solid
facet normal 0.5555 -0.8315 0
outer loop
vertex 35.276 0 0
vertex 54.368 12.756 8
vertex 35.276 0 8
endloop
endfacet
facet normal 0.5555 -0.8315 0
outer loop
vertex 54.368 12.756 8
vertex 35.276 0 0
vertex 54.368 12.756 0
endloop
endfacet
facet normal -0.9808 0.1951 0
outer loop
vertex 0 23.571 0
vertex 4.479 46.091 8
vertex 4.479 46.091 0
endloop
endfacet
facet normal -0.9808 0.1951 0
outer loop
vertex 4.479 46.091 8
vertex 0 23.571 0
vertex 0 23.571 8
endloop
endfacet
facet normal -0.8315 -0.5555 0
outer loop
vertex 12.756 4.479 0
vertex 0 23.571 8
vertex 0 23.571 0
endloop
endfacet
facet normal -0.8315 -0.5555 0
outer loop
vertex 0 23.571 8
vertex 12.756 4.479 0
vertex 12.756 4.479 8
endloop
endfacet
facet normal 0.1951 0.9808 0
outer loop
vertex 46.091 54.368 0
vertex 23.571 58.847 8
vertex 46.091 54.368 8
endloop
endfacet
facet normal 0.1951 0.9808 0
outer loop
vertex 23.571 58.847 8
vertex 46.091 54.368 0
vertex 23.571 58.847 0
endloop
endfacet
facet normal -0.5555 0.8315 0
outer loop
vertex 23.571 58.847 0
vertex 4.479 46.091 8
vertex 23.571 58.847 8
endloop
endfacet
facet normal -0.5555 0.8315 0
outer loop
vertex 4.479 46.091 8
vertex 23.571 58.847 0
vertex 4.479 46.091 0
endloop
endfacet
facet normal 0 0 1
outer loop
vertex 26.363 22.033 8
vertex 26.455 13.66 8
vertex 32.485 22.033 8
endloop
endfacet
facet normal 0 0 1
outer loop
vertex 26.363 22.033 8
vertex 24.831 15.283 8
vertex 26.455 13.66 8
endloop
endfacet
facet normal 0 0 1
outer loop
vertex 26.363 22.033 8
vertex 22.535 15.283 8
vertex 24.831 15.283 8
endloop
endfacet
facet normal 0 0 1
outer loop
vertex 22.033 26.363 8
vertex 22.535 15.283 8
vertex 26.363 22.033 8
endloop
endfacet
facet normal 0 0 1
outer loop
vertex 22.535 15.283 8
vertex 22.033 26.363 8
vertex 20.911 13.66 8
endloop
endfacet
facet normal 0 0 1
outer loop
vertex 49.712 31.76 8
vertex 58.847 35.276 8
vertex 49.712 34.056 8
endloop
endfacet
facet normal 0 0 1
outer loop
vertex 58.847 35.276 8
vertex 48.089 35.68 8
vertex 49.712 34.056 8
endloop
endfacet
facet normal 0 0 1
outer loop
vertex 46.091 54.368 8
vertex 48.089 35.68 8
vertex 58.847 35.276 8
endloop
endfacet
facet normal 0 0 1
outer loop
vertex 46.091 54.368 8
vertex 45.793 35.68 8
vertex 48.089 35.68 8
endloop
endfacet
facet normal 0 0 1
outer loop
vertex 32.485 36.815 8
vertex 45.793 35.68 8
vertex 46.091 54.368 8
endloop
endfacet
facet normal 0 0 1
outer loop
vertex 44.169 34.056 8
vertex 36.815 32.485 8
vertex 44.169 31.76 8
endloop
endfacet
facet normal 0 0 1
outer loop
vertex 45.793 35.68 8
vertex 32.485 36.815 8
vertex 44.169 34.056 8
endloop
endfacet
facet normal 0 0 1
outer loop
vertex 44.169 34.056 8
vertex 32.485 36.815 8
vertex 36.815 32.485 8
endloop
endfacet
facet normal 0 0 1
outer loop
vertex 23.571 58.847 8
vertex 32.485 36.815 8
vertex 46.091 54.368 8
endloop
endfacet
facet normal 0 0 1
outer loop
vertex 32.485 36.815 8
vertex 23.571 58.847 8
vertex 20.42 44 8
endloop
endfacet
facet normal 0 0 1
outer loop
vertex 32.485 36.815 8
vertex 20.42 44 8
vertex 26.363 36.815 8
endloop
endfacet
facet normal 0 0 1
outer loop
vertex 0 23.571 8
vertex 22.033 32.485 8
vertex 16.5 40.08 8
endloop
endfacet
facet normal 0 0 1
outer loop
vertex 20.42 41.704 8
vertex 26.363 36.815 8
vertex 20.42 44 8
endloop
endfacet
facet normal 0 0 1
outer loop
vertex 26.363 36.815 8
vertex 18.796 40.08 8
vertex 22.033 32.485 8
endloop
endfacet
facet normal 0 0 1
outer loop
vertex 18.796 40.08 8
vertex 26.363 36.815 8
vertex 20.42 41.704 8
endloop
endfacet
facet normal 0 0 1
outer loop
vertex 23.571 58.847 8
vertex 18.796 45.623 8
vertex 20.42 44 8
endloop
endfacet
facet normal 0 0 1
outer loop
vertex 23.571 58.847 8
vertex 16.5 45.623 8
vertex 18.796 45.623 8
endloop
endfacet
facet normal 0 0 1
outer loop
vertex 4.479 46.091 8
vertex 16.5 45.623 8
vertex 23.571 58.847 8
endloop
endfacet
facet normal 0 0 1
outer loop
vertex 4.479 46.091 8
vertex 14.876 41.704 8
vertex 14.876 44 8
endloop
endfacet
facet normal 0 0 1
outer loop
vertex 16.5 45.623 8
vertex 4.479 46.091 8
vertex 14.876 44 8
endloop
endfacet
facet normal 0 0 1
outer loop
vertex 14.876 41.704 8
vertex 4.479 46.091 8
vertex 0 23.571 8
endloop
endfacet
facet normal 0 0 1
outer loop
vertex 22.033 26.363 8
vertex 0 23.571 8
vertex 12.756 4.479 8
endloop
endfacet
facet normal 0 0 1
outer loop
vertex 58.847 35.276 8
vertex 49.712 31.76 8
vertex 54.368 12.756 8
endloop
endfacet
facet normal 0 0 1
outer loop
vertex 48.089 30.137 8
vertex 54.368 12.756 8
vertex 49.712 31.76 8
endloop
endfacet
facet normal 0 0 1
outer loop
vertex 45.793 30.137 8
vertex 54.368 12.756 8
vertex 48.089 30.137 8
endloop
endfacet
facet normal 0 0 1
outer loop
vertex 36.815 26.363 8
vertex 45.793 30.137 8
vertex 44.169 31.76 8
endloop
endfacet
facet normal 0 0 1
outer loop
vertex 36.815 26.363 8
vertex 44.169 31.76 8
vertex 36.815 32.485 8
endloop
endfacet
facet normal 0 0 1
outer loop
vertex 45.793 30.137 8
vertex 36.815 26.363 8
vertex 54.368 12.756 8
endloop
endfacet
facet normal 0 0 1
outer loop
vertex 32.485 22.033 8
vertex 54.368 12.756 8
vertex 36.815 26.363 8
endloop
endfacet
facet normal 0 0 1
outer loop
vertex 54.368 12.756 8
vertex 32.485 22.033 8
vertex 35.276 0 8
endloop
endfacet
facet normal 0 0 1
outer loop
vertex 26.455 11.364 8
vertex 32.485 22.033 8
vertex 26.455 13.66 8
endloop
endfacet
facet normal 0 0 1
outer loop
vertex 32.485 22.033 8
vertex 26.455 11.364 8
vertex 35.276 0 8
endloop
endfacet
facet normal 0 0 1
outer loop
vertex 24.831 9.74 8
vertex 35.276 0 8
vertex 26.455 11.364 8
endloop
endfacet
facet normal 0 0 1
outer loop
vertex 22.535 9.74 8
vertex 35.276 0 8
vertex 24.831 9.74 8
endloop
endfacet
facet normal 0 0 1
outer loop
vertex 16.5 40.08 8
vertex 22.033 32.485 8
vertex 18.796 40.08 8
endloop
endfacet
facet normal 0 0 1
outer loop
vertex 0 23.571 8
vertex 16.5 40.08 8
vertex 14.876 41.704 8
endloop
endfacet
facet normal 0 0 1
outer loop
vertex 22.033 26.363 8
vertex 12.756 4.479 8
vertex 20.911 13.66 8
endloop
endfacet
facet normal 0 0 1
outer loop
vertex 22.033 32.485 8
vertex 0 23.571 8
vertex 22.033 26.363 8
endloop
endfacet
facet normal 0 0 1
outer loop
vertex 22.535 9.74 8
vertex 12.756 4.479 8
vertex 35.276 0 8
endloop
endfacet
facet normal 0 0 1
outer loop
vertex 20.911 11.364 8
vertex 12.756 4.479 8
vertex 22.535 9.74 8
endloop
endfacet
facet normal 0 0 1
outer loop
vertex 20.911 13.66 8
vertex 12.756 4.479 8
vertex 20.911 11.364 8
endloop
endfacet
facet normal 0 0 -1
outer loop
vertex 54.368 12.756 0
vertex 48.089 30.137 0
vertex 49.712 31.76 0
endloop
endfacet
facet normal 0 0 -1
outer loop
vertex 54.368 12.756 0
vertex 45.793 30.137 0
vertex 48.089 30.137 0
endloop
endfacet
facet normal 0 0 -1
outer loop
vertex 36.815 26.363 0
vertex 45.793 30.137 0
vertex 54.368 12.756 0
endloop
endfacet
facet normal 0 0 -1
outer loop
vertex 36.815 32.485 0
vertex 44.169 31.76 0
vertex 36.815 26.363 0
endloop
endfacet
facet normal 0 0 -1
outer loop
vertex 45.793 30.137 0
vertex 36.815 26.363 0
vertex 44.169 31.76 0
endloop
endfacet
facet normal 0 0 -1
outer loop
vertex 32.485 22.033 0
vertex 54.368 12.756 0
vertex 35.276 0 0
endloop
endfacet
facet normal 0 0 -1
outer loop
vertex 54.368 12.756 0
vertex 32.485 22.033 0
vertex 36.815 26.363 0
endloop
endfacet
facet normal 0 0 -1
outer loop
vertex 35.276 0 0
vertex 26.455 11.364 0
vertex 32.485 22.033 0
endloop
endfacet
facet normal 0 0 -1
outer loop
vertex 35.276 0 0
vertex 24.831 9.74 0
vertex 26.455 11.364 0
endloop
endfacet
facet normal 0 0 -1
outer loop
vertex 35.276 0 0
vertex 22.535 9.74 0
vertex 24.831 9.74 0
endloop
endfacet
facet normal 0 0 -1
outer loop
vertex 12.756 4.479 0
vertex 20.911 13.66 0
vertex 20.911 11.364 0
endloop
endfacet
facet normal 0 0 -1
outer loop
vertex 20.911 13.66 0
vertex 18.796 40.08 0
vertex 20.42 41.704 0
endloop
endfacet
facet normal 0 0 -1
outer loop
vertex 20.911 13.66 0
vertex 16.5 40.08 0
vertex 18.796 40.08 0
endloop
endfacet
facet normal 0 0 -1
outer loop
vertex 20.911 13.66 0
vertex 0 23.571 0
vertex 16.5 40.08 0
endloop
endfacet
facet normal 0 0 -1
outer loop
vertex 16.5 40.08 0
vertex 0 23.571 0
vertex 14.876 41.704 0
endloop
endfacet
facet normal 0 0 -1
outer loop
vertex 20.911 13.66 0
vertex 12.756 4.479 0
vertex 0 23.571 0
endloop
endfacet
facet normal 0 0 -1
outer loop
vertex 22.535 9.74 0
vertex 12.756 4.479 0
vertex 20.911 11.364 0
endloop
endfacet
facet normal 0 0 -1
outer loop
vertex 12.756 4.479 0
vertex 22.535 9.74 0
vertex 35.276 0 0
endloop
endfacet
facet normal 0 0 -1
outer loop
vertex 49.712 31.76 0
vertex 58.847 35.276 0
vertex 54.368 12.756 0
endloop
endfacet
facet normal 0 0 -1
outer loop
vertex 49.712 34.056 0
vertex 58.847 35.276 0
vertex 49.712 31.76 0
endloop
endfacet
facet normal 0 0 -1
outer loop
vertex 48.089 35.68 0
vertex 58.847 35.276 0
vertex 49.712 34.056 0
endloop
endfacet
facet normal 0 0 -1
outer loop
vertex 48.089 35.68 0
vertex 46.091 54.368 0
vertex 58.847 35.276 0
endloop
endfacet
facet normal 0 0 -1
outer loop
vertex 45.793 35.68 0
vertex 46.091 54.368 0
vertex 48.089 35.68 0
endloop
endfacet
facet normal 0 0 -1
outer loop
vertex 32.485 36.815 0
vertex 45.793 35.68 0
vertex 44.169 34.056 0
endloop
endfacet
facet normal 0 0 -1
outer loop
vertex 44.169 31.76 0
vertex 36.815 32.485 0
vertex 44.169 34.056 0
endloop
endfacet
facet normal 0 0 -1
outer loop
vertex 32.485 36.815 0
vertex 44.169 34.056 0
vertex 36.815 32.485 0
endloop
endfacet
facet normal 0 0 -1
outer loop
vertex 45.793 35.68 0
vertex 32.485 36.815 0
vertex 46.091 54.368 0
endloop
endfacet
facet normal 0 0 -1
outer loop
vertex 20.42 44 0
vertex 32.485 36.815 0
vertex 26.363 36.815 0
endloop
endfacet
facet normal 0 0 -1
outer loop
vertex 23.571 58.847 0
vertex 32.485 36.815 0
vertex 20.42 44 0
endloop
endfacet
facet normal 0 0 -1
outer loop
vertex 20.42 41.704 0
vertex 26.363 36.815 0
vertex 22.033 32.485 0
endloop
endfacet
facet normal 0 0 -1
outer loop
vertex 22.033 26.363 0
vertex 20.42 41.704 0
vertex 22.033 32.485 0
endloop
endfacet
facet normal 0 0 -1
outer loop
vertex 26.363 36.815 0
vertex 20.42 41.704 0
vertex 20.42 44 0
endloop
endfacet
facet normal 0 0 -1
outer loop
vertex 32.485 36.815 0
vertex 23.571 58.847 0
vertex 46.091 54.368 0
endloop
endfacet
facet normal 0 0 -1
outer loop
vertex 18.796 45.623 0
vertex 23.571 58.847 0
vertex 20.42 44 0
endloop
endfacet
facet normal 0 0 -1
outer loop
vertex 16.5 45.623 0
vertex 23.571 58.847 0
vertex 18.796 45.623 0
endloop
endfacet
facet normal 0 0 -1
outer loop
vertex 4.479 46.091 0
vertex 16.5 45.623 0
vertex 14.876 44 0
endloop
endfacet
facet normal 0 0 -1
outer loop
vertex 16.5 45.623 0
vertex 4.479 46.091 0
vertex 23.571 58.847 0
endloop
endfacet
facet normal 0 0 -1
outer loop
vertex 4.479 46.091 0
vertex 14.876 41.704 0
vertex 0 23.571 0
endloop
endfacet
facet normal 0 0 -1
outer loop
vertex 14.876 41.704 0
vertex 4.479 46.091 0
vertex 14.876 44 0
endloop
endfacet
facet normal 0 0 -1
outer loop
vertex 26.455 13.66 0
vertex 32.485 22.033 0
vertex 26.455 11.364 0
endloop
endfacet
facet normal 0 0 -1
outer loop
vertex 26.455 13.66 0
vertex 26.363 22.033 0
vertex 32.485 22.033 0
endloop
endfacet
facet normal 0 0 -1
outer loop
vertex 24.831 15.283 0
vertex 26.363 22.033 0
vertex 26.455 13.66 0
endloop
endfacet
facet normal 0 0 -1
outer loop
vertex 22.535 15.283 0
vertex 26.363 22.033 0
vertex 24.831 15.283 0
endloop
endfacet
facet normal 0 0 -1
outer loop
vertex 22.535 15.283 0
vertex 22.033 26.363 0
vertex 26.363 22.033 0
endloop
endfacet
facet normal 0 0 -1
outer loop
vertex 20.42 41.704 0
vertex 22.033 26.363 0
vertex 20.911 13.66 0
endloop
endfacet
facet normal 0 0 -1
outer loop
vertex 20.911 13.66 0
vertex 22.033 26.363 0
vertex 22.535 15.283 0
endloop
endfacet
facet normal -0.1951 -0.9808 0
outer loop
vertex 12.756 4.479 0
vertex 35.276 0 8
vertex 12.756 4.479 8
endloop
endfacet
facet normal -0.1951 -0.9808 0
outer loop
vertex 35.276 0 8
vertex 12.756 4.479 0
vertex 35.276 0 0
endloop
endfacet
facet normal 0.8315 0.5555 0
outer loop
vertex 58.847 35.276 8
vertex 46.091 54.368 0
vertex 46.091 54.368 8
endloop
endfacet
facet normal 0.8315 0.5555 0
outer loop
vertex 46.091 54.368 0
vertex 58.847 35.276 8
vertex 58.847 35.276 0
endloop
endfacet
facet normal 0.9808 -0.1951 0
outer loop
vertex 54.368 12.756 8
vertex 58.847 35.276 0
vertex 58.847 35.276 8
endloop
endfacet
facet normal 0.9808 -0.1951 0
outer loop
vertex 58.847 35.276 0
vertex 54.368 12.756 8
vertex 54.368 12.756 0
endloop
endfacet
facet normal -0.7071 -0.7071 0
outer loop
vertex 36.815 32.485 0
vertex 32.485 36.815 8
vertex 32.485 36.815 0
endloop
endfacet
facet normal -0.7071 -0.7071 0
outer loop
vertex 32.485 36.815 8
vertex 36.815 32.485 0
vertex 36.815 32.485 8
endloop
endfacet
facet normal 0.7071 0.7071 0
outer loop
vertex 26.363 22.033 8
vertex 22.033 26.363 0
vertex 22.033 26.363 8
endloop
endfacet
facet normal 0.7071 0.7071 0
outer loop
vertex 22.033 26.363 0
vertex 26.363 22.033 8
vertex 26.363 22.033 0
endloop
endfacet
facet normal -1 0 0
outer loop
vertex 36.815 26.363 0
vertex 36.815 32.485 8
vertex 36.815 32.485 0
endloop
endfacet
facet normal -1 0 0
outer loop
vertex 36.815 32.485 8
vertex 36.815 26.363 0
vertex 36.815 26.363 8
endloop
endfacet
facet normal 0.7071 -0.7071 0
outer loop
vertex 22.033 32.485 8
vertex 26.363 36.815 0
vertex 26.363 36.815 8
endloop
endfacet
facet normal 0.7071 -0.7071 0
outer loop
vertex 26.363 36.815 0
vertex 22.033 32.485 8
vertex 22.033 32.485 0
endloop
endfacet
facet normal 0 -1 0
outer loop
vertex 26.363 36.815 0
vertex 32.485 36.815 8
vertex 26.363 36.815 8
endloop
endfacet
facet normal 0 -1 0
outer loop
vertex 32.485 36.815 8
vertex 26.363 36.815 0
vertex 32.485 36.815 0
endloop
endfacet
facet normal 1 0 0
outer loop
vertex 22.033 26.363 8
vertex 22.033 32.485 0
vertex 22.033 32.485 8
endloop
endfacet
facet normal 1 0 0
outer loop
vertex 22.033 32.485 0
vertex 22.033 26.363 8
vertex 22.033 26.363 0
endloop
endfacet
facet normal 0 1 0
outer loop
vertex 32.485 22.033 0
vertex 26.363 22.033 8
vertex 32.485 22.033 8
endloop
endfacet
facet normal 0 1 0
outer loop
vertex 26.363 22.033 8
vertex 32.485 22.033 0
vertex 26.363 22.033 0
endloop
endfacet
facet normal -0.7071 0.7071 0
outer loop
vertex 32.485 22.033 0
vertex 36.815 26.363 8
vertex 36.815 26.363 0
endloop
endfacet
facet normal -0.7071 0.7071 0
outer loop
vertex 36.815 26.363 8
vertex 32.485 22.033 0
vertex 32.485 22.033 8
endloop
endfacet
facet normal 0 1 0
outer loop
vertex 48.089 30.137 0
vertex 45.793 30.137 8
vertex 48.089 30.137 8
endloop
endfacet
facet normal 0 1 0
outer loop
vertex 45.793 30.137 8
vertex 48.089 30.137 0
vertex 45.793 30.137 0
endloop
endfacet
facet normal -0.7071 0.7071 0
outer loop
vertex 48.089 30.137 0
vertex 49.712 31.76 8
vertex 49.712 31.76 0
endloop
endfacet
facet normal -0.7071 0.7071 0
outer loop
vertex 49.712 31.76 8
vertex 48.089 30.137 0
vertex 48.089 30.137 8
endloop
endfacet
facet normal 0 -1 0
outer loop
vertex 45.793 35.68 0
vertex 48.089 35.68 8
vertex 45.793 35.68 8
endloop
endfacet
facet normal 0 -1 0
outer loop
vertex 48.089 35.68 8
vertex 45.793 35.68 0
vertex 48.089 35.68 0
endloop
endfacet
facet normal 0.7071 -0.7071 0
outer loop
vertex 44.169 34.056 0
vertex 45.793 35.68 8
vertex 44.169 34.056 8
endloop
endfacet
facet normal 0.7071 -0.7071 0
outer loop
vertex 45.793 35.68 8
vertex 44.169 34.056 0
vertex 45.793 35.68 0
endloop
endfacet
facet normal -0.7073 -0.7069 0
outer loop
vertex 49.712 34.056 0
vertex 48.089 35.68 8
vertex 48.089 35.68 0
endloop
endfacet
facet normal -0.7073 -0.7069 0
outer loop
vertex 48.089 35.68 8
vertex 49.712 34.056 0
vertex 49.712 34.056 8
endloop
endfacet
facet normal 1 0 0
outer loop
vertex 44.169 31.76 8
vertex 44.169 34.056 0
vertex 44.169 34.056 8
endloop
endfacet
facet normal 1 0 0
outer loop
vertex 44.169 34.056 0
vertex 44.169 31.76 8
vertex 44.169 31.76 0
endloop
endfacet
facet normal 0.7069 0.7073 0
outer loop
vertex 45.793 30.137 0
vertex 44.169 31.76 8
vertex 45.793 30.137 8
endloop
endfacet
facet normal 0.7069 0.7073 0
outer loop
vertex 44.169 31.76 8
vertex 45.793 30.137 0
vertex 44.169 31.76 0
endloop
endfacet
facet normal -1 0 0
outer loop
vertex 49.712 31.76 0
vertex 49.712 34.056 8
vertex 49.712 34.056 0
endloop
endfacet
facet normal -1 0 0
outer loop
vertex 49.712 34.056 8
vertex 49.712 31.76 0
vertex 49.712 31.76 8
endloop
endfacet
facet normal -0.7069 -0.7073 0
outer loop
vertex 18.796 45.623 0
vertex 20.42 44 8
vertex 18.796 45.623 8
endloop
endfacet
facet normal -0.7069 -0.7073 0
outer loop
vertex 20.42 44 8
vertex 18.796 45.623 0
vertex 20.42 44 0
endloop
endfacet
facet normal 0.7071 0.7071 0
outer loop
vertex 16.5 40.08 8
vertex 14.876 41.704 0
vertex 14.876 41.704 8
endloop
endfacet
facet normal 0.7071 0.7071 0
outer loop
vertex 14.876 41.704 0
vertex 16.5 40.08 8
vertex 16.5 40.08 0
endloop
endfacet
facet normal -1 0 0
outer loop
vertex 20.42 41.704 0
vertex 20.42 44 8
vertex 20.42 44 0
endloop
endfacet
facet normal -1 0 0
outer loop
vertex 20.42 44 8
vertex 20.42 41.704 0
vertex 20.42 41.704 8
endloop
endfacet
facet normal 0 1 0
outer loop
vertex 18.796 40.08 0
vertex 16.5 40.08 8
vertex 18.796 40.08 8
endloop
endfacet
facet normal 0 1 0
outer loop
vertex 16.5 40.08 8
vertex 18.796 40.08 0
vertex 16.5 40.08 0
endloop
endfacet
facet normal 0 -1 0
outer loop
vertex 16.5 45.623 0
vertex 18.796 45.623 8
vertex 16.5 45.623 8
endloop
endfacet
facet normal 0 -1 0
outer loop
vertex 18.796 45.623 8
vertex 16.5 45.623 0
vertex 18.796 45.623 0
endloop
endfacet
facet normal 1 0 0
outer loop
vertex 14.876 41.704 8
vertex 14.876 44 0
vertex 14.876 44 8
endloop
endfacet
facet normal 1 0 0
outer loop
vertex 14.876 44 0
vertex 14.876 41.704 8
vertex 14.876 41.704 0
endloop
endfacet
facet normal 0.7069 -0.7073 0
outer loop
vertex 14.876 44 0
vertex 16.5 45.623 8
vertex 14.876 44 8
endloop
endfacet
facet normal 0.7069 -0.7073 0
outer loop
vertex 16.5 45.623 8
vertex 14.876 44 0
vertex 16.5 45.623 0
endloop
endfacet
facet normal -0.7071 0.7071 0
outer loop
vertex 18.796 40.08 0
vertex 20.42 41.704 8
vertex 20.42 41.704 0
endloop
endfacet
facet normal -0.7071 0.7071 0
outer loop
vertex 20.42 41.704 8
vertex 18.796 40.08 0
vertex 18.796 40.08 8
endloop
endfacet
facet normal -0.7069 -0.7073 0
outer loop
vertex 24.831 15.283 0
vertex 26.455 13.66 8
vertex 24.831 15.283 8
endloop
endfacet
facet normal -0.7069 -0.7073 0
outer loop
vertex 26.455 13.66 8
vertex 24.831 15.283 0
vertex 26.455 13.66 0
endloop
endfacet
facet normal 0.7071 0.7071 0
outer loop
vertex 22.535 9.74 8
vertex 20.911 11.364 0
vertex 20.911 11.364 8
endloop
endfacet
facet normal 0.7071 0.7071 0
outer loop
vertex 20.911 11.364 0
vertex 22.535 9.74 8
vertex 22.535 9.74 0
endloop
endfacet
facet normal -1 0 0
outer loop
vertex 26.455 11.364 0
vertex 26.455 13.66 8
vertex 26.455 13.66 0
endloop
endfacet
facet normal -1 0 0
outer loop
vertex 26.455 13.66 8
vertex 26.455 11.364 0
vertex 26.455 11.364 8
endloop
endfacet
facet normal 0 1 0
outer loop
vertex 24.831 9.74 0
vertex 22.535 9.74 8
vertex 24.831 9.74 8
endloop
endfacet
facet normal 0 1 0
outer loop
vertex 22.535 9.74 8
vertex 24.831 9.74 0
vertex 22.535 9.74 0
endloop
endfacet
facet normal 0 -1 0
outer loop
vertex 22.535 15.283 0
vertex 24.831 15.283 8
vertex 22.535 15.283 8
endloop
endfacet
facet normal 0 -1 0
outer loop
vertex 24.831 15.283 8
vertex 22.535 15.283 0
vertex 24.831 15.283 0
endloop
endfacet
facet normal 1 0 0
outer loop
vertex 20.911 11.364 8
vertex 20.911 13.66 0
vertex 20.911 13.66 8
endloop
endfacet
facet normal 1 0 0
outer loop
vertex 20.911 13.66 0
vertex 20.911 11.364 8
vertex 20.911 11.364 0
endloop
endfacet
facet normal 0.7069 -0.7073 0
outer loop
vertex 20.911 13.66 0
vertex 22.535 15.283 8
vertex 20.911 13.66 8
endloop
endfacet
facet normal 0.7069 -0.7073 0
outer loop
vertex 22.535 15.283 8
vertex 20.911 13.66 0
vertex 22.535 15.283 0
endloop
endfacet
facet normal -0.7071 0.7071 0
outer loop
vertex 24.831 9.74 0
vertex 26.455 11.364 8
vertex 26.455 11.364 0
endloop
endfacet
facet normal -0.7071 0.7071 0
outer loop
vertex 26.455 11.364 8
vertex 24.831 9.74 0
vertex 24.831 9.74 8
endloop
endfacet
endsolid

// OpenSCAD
$fn = 32;

// ----------------------------------------------------------------------
// Polygon plate: 8-gon R30, 3 bolt windows
// ----------------------------------------------------------------------

// --- parameters (mm) ---
sides = 8;                // number of polygon sides
plate_r = 30;             // circumscribed radius of the polygon
bore_r = 8;               // centre bore radius
bolts = 3;                // number of bolt windows
ring_r = 17.86;           // bolt-circle radius
bolt_r = 3;               // bolt window radius
plate_t = 8;              // plate thickness, Z (extrusion height)
fit_tol = 0.02;           // declared fit tolerance (prompt contract)
free_tol = 0.2;           // declared free tolerance (prompt contract)

plate_d = 2 * plate_r;  // circumscribed diameter
bore_d = 2 * bore_r;  // centre bore diameter
bolt_d = 2 * bolt_r;  // bolt window diameter
ring_d = 2 * ring_r;  // bolt-circle diameter

profile = [[58.847, 35.276], [46.091, 54.368], [23.571, 58.847], [4.479, 46.091], [0, 23.571], [12.756, 4.479], [35.276, 0], [54.368, 12.756]];  // primary outline, 8 points, counter clockwise
void_1 = [[36.815, 32.485], [32.485, 36.815], [26.363, 36.815], [22.033, 32.485], [22.033, 26.363], [26.363, 22.033], [32.485, 22.033], [36.815, 26.363]];  // centre bore, 8 points
void_2 = [[49.712, 34.056], [48.089, 35.68], [45.793, 35.68], [44.169, 34.056], [44.169, 31.76], [45.793, 30.137], [48.089, 30.137], [49.712, 31.76]];  // bolt window 1, 8 points
void_3 = [[20.42, 44], [18.796, 45.623], [16.5, 45.623], [14.876, 44], [14.876, 41.704], [16.5, 40.08], [18.796, 40.08], [20.42, 41.704]];  // bolt window 2, 8 points
void_4 = [[26.455, 13.66], [24.831, 15.283], [22.535, 15.283], [20.911, 13.66], [20.911, 11.364], [22.535, 9.74], [24.831, 9.74], [26.455, 11.364]];  // bolt window 3, 8 points

// --- the one profile operation ---
difference() {
  linear_extrude(height = plate_t) polygon(points = profile);
  translate([0, 0, -1])
    linear_extrude(height = plate_t + 2) polygon(points = void_1);
  translate([0, 0, -1])
    linear_extrude(height = plate_t + 2) polygon(points = void_2);
  translate([0, 0, -1])
    linear_extrude(height = plate_t + 2) polygon(points = void_3);
  translate([0, 0, -1])
    linear_extrude(height = plate_t + 2) polygon(points = void_4);
}
